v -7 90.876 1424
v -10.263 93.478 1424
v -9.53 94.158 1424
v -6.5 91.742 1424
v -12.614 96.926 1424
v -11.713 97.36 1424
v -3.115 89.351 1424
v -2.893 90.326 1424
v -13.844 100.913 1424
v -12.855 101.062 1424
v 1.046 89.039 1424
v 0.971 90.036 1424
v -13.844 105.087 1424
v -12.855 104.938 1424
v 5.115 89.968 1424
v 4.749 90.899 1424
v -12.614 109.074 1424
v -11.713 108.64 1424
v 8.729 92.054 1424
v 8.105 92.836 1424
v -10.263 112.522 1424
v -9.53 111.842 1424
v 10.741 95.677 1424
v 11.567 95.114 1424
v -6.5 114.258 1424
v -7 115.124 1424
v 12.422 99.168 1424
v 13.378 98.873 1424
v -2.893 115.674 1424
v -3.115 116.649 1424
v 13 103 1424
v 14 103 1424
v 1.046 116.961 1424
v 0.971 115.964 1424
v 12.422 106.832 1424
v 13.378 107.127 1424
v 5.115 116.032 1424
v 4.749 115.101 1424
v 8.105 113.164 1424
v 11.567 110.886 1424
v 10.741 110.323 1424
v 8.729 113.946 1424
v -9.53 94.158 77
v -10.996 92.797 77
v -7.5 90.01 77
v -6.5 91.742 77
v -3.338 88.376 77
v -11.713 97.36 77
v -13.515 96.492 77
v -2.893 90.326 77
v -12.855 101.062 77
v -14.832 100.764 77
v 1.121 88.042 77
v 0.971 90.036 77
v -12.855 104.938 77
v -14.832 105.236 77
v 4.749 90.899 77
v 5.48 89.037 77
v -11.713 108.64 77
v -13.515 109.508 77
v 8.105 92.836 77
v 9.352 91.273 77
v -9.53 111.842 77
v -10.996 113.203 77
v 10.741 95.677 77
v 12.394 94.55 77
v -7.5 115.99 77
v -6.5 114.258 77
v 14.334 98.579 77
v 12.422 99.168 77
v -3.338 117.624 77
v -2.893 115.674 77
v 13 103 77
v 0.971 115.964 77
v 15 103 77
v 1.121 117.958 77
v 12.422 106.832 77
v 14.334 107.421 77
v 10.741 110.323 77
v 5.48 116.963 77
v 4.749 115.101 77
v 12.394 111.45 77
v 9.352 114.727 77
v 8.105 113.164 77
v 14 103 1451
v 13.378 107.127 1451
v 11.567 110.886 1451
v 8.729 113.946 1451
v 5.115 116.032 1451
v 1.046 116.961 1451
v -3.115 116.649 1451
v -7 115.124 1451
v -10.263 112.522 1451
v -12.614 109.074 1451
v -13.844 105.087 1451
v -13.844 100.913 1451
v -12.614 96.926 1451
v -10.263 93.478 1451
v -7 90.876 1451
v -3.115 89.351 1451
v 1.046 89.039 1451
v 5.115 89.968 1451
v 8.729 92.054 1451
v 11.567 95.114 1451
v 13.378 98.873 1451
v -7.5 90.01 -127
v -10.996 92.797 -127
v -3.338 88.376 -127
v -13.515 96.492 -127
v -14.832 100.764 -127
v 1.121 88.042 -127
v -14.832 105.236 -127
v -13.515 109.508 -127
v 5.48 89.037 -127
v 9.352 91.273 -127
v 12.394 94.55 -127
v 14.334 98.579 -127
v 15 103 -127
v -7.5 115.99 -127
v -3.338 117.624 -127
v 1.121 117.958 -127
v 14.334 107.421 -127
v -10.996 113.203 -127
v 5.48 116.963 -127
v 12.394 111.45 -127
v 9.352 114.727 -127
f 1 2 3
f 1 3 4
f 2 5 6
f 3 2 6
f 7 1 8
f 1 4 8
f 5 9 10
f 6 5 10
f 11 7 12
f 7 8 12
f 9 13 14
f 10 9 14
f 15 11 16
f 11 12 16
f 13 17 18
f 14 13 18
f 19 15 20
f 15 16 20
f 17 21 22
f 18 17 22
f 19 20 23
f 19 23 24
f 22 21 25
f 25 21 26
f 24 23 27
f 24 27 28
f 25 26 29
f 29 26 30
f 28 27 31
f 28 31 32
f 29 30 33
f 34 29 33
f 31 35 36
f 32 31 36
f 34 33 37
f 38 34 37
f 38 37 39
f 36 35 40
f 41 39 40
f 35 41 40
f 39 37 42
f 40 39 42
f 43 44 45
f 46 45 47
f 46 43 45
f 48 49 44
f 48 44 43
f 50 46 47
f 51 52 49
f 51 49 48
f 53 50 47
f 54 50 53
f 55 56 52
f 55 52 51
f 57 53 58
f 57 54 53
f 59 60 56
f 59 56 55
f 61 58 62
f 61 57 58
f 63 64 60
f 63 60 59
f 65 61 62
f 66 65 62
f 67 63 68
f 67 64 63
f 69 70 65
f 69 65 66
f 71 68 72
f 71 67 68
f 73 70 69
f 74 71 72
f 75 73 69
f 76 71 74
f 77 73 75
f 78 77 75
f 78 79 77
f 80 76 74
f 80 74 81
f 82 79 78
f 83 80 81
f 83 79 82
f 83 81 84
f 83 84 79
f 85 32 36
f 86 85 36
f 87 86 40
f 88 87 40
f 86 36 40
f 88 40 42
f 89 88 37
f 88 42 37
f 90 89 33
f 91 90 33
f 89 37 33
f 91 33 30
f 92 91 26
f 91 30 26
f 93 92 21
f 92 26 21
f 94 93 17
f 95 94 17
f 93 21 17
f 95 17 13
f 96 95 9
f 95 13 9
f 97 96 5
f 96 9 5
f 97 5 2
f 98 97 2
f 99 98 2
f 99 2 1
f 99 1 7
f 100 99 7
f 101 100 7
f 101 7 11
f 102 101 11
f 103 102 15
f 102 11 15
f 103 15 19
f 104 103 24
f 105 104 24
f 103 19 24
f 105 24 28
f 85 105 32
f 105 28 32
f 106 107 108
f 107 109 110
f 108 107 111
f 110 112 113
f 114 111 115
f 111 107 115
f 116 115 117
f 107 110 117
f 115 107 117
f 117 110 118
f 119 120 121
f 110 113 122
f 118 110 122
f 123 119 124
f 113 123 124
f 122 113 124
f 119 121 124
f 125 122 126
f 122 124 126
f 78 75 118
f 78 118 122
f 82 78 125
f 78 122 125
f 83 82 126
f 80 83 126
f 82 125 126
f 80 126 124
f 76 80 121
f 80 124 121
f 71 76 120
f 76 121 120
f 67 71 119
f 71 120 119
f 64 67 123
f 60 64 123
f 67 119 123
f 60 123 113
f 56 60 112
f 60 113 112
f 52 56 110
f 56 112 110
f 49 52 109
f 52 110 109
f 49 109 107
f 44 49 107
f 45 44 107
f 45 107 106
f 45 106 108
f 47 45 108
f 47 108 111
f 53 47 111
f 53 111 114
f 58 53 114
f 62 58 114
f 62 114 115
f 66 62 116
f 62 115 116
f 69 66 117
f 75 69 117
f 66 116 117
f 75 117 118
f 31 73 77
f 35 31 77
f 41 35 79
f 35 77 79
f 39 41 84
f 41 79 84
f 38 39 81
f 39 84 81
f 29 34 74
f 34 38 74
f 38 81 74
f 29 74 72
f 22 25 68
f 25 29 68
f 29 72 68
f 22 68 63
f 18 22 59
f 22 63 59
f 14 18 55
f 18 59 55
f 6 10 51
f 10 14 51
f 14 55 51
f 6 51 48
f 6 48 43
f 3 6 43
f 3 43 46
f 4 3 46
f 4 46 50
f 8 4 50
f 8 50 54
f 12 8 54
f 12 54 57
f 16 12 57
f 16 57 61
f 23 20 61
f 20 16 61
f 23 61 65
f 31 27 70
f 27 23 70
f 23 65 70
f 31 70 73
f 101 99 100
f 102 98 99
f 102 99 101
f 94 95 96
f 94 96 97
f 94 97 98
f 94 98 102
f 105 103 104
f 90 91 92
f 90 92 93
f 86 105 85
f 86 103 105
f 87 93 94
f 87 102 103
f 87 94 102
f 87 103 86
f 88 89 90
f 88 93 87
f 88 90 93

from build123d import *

# Parameters (mm, degrees)
CYLINDER031_R     = 15
CYLINDER031_DEPTH = 204
CYLINDER032_R     = 14
CYLINDER032_DEPTH = 27
CYLINDER030_R     = 13
CYLINDER030_DEPTH = 1390


with BuildPart() as loraantenna001:
    # Cylinder031 → Cylinder031 (new body)
    with BuildSketch(Plane.XY):
        Circle(CYLINDER031_R)
    extrude(amount=CYLINDER031_DEPTH)


with BuildPart() as loraantenna002:
    # Cylinder032 → Cylinder032 (new body)
    with BuildSketch(Plane.XY.offset(1363)):
        Circle(CYLINDER032_R)
    extrude(amount=CYLINDER032_DEPTH)


with BuildPart() as loraantenna004:
    # Cylinder030 → Cylinder030 (new body)
    with BuildSketch(Plane.XY):
        Circle(CYLINDER030_R)
    extrude(amount=CYLINDER030_DEPTH)

    # Fusion006: union loraAntenna002
    add(loraantenna002.part)


with BuildPart() as loraantenna004_1:
    # Fusion006 placement: moved
    add(loraantenna004.part.moved(Location((0, 0, 188))))

    # Fusion007: union loraAntenna001
    add(loraantenna001.part)


with BuildPart() as loraantenna004_2:
    # Fusion007 placement: moved
    add(loraantenna004_1.part.moved(Location((0, 103, -127))))


solid = loraantenna004_2.part
